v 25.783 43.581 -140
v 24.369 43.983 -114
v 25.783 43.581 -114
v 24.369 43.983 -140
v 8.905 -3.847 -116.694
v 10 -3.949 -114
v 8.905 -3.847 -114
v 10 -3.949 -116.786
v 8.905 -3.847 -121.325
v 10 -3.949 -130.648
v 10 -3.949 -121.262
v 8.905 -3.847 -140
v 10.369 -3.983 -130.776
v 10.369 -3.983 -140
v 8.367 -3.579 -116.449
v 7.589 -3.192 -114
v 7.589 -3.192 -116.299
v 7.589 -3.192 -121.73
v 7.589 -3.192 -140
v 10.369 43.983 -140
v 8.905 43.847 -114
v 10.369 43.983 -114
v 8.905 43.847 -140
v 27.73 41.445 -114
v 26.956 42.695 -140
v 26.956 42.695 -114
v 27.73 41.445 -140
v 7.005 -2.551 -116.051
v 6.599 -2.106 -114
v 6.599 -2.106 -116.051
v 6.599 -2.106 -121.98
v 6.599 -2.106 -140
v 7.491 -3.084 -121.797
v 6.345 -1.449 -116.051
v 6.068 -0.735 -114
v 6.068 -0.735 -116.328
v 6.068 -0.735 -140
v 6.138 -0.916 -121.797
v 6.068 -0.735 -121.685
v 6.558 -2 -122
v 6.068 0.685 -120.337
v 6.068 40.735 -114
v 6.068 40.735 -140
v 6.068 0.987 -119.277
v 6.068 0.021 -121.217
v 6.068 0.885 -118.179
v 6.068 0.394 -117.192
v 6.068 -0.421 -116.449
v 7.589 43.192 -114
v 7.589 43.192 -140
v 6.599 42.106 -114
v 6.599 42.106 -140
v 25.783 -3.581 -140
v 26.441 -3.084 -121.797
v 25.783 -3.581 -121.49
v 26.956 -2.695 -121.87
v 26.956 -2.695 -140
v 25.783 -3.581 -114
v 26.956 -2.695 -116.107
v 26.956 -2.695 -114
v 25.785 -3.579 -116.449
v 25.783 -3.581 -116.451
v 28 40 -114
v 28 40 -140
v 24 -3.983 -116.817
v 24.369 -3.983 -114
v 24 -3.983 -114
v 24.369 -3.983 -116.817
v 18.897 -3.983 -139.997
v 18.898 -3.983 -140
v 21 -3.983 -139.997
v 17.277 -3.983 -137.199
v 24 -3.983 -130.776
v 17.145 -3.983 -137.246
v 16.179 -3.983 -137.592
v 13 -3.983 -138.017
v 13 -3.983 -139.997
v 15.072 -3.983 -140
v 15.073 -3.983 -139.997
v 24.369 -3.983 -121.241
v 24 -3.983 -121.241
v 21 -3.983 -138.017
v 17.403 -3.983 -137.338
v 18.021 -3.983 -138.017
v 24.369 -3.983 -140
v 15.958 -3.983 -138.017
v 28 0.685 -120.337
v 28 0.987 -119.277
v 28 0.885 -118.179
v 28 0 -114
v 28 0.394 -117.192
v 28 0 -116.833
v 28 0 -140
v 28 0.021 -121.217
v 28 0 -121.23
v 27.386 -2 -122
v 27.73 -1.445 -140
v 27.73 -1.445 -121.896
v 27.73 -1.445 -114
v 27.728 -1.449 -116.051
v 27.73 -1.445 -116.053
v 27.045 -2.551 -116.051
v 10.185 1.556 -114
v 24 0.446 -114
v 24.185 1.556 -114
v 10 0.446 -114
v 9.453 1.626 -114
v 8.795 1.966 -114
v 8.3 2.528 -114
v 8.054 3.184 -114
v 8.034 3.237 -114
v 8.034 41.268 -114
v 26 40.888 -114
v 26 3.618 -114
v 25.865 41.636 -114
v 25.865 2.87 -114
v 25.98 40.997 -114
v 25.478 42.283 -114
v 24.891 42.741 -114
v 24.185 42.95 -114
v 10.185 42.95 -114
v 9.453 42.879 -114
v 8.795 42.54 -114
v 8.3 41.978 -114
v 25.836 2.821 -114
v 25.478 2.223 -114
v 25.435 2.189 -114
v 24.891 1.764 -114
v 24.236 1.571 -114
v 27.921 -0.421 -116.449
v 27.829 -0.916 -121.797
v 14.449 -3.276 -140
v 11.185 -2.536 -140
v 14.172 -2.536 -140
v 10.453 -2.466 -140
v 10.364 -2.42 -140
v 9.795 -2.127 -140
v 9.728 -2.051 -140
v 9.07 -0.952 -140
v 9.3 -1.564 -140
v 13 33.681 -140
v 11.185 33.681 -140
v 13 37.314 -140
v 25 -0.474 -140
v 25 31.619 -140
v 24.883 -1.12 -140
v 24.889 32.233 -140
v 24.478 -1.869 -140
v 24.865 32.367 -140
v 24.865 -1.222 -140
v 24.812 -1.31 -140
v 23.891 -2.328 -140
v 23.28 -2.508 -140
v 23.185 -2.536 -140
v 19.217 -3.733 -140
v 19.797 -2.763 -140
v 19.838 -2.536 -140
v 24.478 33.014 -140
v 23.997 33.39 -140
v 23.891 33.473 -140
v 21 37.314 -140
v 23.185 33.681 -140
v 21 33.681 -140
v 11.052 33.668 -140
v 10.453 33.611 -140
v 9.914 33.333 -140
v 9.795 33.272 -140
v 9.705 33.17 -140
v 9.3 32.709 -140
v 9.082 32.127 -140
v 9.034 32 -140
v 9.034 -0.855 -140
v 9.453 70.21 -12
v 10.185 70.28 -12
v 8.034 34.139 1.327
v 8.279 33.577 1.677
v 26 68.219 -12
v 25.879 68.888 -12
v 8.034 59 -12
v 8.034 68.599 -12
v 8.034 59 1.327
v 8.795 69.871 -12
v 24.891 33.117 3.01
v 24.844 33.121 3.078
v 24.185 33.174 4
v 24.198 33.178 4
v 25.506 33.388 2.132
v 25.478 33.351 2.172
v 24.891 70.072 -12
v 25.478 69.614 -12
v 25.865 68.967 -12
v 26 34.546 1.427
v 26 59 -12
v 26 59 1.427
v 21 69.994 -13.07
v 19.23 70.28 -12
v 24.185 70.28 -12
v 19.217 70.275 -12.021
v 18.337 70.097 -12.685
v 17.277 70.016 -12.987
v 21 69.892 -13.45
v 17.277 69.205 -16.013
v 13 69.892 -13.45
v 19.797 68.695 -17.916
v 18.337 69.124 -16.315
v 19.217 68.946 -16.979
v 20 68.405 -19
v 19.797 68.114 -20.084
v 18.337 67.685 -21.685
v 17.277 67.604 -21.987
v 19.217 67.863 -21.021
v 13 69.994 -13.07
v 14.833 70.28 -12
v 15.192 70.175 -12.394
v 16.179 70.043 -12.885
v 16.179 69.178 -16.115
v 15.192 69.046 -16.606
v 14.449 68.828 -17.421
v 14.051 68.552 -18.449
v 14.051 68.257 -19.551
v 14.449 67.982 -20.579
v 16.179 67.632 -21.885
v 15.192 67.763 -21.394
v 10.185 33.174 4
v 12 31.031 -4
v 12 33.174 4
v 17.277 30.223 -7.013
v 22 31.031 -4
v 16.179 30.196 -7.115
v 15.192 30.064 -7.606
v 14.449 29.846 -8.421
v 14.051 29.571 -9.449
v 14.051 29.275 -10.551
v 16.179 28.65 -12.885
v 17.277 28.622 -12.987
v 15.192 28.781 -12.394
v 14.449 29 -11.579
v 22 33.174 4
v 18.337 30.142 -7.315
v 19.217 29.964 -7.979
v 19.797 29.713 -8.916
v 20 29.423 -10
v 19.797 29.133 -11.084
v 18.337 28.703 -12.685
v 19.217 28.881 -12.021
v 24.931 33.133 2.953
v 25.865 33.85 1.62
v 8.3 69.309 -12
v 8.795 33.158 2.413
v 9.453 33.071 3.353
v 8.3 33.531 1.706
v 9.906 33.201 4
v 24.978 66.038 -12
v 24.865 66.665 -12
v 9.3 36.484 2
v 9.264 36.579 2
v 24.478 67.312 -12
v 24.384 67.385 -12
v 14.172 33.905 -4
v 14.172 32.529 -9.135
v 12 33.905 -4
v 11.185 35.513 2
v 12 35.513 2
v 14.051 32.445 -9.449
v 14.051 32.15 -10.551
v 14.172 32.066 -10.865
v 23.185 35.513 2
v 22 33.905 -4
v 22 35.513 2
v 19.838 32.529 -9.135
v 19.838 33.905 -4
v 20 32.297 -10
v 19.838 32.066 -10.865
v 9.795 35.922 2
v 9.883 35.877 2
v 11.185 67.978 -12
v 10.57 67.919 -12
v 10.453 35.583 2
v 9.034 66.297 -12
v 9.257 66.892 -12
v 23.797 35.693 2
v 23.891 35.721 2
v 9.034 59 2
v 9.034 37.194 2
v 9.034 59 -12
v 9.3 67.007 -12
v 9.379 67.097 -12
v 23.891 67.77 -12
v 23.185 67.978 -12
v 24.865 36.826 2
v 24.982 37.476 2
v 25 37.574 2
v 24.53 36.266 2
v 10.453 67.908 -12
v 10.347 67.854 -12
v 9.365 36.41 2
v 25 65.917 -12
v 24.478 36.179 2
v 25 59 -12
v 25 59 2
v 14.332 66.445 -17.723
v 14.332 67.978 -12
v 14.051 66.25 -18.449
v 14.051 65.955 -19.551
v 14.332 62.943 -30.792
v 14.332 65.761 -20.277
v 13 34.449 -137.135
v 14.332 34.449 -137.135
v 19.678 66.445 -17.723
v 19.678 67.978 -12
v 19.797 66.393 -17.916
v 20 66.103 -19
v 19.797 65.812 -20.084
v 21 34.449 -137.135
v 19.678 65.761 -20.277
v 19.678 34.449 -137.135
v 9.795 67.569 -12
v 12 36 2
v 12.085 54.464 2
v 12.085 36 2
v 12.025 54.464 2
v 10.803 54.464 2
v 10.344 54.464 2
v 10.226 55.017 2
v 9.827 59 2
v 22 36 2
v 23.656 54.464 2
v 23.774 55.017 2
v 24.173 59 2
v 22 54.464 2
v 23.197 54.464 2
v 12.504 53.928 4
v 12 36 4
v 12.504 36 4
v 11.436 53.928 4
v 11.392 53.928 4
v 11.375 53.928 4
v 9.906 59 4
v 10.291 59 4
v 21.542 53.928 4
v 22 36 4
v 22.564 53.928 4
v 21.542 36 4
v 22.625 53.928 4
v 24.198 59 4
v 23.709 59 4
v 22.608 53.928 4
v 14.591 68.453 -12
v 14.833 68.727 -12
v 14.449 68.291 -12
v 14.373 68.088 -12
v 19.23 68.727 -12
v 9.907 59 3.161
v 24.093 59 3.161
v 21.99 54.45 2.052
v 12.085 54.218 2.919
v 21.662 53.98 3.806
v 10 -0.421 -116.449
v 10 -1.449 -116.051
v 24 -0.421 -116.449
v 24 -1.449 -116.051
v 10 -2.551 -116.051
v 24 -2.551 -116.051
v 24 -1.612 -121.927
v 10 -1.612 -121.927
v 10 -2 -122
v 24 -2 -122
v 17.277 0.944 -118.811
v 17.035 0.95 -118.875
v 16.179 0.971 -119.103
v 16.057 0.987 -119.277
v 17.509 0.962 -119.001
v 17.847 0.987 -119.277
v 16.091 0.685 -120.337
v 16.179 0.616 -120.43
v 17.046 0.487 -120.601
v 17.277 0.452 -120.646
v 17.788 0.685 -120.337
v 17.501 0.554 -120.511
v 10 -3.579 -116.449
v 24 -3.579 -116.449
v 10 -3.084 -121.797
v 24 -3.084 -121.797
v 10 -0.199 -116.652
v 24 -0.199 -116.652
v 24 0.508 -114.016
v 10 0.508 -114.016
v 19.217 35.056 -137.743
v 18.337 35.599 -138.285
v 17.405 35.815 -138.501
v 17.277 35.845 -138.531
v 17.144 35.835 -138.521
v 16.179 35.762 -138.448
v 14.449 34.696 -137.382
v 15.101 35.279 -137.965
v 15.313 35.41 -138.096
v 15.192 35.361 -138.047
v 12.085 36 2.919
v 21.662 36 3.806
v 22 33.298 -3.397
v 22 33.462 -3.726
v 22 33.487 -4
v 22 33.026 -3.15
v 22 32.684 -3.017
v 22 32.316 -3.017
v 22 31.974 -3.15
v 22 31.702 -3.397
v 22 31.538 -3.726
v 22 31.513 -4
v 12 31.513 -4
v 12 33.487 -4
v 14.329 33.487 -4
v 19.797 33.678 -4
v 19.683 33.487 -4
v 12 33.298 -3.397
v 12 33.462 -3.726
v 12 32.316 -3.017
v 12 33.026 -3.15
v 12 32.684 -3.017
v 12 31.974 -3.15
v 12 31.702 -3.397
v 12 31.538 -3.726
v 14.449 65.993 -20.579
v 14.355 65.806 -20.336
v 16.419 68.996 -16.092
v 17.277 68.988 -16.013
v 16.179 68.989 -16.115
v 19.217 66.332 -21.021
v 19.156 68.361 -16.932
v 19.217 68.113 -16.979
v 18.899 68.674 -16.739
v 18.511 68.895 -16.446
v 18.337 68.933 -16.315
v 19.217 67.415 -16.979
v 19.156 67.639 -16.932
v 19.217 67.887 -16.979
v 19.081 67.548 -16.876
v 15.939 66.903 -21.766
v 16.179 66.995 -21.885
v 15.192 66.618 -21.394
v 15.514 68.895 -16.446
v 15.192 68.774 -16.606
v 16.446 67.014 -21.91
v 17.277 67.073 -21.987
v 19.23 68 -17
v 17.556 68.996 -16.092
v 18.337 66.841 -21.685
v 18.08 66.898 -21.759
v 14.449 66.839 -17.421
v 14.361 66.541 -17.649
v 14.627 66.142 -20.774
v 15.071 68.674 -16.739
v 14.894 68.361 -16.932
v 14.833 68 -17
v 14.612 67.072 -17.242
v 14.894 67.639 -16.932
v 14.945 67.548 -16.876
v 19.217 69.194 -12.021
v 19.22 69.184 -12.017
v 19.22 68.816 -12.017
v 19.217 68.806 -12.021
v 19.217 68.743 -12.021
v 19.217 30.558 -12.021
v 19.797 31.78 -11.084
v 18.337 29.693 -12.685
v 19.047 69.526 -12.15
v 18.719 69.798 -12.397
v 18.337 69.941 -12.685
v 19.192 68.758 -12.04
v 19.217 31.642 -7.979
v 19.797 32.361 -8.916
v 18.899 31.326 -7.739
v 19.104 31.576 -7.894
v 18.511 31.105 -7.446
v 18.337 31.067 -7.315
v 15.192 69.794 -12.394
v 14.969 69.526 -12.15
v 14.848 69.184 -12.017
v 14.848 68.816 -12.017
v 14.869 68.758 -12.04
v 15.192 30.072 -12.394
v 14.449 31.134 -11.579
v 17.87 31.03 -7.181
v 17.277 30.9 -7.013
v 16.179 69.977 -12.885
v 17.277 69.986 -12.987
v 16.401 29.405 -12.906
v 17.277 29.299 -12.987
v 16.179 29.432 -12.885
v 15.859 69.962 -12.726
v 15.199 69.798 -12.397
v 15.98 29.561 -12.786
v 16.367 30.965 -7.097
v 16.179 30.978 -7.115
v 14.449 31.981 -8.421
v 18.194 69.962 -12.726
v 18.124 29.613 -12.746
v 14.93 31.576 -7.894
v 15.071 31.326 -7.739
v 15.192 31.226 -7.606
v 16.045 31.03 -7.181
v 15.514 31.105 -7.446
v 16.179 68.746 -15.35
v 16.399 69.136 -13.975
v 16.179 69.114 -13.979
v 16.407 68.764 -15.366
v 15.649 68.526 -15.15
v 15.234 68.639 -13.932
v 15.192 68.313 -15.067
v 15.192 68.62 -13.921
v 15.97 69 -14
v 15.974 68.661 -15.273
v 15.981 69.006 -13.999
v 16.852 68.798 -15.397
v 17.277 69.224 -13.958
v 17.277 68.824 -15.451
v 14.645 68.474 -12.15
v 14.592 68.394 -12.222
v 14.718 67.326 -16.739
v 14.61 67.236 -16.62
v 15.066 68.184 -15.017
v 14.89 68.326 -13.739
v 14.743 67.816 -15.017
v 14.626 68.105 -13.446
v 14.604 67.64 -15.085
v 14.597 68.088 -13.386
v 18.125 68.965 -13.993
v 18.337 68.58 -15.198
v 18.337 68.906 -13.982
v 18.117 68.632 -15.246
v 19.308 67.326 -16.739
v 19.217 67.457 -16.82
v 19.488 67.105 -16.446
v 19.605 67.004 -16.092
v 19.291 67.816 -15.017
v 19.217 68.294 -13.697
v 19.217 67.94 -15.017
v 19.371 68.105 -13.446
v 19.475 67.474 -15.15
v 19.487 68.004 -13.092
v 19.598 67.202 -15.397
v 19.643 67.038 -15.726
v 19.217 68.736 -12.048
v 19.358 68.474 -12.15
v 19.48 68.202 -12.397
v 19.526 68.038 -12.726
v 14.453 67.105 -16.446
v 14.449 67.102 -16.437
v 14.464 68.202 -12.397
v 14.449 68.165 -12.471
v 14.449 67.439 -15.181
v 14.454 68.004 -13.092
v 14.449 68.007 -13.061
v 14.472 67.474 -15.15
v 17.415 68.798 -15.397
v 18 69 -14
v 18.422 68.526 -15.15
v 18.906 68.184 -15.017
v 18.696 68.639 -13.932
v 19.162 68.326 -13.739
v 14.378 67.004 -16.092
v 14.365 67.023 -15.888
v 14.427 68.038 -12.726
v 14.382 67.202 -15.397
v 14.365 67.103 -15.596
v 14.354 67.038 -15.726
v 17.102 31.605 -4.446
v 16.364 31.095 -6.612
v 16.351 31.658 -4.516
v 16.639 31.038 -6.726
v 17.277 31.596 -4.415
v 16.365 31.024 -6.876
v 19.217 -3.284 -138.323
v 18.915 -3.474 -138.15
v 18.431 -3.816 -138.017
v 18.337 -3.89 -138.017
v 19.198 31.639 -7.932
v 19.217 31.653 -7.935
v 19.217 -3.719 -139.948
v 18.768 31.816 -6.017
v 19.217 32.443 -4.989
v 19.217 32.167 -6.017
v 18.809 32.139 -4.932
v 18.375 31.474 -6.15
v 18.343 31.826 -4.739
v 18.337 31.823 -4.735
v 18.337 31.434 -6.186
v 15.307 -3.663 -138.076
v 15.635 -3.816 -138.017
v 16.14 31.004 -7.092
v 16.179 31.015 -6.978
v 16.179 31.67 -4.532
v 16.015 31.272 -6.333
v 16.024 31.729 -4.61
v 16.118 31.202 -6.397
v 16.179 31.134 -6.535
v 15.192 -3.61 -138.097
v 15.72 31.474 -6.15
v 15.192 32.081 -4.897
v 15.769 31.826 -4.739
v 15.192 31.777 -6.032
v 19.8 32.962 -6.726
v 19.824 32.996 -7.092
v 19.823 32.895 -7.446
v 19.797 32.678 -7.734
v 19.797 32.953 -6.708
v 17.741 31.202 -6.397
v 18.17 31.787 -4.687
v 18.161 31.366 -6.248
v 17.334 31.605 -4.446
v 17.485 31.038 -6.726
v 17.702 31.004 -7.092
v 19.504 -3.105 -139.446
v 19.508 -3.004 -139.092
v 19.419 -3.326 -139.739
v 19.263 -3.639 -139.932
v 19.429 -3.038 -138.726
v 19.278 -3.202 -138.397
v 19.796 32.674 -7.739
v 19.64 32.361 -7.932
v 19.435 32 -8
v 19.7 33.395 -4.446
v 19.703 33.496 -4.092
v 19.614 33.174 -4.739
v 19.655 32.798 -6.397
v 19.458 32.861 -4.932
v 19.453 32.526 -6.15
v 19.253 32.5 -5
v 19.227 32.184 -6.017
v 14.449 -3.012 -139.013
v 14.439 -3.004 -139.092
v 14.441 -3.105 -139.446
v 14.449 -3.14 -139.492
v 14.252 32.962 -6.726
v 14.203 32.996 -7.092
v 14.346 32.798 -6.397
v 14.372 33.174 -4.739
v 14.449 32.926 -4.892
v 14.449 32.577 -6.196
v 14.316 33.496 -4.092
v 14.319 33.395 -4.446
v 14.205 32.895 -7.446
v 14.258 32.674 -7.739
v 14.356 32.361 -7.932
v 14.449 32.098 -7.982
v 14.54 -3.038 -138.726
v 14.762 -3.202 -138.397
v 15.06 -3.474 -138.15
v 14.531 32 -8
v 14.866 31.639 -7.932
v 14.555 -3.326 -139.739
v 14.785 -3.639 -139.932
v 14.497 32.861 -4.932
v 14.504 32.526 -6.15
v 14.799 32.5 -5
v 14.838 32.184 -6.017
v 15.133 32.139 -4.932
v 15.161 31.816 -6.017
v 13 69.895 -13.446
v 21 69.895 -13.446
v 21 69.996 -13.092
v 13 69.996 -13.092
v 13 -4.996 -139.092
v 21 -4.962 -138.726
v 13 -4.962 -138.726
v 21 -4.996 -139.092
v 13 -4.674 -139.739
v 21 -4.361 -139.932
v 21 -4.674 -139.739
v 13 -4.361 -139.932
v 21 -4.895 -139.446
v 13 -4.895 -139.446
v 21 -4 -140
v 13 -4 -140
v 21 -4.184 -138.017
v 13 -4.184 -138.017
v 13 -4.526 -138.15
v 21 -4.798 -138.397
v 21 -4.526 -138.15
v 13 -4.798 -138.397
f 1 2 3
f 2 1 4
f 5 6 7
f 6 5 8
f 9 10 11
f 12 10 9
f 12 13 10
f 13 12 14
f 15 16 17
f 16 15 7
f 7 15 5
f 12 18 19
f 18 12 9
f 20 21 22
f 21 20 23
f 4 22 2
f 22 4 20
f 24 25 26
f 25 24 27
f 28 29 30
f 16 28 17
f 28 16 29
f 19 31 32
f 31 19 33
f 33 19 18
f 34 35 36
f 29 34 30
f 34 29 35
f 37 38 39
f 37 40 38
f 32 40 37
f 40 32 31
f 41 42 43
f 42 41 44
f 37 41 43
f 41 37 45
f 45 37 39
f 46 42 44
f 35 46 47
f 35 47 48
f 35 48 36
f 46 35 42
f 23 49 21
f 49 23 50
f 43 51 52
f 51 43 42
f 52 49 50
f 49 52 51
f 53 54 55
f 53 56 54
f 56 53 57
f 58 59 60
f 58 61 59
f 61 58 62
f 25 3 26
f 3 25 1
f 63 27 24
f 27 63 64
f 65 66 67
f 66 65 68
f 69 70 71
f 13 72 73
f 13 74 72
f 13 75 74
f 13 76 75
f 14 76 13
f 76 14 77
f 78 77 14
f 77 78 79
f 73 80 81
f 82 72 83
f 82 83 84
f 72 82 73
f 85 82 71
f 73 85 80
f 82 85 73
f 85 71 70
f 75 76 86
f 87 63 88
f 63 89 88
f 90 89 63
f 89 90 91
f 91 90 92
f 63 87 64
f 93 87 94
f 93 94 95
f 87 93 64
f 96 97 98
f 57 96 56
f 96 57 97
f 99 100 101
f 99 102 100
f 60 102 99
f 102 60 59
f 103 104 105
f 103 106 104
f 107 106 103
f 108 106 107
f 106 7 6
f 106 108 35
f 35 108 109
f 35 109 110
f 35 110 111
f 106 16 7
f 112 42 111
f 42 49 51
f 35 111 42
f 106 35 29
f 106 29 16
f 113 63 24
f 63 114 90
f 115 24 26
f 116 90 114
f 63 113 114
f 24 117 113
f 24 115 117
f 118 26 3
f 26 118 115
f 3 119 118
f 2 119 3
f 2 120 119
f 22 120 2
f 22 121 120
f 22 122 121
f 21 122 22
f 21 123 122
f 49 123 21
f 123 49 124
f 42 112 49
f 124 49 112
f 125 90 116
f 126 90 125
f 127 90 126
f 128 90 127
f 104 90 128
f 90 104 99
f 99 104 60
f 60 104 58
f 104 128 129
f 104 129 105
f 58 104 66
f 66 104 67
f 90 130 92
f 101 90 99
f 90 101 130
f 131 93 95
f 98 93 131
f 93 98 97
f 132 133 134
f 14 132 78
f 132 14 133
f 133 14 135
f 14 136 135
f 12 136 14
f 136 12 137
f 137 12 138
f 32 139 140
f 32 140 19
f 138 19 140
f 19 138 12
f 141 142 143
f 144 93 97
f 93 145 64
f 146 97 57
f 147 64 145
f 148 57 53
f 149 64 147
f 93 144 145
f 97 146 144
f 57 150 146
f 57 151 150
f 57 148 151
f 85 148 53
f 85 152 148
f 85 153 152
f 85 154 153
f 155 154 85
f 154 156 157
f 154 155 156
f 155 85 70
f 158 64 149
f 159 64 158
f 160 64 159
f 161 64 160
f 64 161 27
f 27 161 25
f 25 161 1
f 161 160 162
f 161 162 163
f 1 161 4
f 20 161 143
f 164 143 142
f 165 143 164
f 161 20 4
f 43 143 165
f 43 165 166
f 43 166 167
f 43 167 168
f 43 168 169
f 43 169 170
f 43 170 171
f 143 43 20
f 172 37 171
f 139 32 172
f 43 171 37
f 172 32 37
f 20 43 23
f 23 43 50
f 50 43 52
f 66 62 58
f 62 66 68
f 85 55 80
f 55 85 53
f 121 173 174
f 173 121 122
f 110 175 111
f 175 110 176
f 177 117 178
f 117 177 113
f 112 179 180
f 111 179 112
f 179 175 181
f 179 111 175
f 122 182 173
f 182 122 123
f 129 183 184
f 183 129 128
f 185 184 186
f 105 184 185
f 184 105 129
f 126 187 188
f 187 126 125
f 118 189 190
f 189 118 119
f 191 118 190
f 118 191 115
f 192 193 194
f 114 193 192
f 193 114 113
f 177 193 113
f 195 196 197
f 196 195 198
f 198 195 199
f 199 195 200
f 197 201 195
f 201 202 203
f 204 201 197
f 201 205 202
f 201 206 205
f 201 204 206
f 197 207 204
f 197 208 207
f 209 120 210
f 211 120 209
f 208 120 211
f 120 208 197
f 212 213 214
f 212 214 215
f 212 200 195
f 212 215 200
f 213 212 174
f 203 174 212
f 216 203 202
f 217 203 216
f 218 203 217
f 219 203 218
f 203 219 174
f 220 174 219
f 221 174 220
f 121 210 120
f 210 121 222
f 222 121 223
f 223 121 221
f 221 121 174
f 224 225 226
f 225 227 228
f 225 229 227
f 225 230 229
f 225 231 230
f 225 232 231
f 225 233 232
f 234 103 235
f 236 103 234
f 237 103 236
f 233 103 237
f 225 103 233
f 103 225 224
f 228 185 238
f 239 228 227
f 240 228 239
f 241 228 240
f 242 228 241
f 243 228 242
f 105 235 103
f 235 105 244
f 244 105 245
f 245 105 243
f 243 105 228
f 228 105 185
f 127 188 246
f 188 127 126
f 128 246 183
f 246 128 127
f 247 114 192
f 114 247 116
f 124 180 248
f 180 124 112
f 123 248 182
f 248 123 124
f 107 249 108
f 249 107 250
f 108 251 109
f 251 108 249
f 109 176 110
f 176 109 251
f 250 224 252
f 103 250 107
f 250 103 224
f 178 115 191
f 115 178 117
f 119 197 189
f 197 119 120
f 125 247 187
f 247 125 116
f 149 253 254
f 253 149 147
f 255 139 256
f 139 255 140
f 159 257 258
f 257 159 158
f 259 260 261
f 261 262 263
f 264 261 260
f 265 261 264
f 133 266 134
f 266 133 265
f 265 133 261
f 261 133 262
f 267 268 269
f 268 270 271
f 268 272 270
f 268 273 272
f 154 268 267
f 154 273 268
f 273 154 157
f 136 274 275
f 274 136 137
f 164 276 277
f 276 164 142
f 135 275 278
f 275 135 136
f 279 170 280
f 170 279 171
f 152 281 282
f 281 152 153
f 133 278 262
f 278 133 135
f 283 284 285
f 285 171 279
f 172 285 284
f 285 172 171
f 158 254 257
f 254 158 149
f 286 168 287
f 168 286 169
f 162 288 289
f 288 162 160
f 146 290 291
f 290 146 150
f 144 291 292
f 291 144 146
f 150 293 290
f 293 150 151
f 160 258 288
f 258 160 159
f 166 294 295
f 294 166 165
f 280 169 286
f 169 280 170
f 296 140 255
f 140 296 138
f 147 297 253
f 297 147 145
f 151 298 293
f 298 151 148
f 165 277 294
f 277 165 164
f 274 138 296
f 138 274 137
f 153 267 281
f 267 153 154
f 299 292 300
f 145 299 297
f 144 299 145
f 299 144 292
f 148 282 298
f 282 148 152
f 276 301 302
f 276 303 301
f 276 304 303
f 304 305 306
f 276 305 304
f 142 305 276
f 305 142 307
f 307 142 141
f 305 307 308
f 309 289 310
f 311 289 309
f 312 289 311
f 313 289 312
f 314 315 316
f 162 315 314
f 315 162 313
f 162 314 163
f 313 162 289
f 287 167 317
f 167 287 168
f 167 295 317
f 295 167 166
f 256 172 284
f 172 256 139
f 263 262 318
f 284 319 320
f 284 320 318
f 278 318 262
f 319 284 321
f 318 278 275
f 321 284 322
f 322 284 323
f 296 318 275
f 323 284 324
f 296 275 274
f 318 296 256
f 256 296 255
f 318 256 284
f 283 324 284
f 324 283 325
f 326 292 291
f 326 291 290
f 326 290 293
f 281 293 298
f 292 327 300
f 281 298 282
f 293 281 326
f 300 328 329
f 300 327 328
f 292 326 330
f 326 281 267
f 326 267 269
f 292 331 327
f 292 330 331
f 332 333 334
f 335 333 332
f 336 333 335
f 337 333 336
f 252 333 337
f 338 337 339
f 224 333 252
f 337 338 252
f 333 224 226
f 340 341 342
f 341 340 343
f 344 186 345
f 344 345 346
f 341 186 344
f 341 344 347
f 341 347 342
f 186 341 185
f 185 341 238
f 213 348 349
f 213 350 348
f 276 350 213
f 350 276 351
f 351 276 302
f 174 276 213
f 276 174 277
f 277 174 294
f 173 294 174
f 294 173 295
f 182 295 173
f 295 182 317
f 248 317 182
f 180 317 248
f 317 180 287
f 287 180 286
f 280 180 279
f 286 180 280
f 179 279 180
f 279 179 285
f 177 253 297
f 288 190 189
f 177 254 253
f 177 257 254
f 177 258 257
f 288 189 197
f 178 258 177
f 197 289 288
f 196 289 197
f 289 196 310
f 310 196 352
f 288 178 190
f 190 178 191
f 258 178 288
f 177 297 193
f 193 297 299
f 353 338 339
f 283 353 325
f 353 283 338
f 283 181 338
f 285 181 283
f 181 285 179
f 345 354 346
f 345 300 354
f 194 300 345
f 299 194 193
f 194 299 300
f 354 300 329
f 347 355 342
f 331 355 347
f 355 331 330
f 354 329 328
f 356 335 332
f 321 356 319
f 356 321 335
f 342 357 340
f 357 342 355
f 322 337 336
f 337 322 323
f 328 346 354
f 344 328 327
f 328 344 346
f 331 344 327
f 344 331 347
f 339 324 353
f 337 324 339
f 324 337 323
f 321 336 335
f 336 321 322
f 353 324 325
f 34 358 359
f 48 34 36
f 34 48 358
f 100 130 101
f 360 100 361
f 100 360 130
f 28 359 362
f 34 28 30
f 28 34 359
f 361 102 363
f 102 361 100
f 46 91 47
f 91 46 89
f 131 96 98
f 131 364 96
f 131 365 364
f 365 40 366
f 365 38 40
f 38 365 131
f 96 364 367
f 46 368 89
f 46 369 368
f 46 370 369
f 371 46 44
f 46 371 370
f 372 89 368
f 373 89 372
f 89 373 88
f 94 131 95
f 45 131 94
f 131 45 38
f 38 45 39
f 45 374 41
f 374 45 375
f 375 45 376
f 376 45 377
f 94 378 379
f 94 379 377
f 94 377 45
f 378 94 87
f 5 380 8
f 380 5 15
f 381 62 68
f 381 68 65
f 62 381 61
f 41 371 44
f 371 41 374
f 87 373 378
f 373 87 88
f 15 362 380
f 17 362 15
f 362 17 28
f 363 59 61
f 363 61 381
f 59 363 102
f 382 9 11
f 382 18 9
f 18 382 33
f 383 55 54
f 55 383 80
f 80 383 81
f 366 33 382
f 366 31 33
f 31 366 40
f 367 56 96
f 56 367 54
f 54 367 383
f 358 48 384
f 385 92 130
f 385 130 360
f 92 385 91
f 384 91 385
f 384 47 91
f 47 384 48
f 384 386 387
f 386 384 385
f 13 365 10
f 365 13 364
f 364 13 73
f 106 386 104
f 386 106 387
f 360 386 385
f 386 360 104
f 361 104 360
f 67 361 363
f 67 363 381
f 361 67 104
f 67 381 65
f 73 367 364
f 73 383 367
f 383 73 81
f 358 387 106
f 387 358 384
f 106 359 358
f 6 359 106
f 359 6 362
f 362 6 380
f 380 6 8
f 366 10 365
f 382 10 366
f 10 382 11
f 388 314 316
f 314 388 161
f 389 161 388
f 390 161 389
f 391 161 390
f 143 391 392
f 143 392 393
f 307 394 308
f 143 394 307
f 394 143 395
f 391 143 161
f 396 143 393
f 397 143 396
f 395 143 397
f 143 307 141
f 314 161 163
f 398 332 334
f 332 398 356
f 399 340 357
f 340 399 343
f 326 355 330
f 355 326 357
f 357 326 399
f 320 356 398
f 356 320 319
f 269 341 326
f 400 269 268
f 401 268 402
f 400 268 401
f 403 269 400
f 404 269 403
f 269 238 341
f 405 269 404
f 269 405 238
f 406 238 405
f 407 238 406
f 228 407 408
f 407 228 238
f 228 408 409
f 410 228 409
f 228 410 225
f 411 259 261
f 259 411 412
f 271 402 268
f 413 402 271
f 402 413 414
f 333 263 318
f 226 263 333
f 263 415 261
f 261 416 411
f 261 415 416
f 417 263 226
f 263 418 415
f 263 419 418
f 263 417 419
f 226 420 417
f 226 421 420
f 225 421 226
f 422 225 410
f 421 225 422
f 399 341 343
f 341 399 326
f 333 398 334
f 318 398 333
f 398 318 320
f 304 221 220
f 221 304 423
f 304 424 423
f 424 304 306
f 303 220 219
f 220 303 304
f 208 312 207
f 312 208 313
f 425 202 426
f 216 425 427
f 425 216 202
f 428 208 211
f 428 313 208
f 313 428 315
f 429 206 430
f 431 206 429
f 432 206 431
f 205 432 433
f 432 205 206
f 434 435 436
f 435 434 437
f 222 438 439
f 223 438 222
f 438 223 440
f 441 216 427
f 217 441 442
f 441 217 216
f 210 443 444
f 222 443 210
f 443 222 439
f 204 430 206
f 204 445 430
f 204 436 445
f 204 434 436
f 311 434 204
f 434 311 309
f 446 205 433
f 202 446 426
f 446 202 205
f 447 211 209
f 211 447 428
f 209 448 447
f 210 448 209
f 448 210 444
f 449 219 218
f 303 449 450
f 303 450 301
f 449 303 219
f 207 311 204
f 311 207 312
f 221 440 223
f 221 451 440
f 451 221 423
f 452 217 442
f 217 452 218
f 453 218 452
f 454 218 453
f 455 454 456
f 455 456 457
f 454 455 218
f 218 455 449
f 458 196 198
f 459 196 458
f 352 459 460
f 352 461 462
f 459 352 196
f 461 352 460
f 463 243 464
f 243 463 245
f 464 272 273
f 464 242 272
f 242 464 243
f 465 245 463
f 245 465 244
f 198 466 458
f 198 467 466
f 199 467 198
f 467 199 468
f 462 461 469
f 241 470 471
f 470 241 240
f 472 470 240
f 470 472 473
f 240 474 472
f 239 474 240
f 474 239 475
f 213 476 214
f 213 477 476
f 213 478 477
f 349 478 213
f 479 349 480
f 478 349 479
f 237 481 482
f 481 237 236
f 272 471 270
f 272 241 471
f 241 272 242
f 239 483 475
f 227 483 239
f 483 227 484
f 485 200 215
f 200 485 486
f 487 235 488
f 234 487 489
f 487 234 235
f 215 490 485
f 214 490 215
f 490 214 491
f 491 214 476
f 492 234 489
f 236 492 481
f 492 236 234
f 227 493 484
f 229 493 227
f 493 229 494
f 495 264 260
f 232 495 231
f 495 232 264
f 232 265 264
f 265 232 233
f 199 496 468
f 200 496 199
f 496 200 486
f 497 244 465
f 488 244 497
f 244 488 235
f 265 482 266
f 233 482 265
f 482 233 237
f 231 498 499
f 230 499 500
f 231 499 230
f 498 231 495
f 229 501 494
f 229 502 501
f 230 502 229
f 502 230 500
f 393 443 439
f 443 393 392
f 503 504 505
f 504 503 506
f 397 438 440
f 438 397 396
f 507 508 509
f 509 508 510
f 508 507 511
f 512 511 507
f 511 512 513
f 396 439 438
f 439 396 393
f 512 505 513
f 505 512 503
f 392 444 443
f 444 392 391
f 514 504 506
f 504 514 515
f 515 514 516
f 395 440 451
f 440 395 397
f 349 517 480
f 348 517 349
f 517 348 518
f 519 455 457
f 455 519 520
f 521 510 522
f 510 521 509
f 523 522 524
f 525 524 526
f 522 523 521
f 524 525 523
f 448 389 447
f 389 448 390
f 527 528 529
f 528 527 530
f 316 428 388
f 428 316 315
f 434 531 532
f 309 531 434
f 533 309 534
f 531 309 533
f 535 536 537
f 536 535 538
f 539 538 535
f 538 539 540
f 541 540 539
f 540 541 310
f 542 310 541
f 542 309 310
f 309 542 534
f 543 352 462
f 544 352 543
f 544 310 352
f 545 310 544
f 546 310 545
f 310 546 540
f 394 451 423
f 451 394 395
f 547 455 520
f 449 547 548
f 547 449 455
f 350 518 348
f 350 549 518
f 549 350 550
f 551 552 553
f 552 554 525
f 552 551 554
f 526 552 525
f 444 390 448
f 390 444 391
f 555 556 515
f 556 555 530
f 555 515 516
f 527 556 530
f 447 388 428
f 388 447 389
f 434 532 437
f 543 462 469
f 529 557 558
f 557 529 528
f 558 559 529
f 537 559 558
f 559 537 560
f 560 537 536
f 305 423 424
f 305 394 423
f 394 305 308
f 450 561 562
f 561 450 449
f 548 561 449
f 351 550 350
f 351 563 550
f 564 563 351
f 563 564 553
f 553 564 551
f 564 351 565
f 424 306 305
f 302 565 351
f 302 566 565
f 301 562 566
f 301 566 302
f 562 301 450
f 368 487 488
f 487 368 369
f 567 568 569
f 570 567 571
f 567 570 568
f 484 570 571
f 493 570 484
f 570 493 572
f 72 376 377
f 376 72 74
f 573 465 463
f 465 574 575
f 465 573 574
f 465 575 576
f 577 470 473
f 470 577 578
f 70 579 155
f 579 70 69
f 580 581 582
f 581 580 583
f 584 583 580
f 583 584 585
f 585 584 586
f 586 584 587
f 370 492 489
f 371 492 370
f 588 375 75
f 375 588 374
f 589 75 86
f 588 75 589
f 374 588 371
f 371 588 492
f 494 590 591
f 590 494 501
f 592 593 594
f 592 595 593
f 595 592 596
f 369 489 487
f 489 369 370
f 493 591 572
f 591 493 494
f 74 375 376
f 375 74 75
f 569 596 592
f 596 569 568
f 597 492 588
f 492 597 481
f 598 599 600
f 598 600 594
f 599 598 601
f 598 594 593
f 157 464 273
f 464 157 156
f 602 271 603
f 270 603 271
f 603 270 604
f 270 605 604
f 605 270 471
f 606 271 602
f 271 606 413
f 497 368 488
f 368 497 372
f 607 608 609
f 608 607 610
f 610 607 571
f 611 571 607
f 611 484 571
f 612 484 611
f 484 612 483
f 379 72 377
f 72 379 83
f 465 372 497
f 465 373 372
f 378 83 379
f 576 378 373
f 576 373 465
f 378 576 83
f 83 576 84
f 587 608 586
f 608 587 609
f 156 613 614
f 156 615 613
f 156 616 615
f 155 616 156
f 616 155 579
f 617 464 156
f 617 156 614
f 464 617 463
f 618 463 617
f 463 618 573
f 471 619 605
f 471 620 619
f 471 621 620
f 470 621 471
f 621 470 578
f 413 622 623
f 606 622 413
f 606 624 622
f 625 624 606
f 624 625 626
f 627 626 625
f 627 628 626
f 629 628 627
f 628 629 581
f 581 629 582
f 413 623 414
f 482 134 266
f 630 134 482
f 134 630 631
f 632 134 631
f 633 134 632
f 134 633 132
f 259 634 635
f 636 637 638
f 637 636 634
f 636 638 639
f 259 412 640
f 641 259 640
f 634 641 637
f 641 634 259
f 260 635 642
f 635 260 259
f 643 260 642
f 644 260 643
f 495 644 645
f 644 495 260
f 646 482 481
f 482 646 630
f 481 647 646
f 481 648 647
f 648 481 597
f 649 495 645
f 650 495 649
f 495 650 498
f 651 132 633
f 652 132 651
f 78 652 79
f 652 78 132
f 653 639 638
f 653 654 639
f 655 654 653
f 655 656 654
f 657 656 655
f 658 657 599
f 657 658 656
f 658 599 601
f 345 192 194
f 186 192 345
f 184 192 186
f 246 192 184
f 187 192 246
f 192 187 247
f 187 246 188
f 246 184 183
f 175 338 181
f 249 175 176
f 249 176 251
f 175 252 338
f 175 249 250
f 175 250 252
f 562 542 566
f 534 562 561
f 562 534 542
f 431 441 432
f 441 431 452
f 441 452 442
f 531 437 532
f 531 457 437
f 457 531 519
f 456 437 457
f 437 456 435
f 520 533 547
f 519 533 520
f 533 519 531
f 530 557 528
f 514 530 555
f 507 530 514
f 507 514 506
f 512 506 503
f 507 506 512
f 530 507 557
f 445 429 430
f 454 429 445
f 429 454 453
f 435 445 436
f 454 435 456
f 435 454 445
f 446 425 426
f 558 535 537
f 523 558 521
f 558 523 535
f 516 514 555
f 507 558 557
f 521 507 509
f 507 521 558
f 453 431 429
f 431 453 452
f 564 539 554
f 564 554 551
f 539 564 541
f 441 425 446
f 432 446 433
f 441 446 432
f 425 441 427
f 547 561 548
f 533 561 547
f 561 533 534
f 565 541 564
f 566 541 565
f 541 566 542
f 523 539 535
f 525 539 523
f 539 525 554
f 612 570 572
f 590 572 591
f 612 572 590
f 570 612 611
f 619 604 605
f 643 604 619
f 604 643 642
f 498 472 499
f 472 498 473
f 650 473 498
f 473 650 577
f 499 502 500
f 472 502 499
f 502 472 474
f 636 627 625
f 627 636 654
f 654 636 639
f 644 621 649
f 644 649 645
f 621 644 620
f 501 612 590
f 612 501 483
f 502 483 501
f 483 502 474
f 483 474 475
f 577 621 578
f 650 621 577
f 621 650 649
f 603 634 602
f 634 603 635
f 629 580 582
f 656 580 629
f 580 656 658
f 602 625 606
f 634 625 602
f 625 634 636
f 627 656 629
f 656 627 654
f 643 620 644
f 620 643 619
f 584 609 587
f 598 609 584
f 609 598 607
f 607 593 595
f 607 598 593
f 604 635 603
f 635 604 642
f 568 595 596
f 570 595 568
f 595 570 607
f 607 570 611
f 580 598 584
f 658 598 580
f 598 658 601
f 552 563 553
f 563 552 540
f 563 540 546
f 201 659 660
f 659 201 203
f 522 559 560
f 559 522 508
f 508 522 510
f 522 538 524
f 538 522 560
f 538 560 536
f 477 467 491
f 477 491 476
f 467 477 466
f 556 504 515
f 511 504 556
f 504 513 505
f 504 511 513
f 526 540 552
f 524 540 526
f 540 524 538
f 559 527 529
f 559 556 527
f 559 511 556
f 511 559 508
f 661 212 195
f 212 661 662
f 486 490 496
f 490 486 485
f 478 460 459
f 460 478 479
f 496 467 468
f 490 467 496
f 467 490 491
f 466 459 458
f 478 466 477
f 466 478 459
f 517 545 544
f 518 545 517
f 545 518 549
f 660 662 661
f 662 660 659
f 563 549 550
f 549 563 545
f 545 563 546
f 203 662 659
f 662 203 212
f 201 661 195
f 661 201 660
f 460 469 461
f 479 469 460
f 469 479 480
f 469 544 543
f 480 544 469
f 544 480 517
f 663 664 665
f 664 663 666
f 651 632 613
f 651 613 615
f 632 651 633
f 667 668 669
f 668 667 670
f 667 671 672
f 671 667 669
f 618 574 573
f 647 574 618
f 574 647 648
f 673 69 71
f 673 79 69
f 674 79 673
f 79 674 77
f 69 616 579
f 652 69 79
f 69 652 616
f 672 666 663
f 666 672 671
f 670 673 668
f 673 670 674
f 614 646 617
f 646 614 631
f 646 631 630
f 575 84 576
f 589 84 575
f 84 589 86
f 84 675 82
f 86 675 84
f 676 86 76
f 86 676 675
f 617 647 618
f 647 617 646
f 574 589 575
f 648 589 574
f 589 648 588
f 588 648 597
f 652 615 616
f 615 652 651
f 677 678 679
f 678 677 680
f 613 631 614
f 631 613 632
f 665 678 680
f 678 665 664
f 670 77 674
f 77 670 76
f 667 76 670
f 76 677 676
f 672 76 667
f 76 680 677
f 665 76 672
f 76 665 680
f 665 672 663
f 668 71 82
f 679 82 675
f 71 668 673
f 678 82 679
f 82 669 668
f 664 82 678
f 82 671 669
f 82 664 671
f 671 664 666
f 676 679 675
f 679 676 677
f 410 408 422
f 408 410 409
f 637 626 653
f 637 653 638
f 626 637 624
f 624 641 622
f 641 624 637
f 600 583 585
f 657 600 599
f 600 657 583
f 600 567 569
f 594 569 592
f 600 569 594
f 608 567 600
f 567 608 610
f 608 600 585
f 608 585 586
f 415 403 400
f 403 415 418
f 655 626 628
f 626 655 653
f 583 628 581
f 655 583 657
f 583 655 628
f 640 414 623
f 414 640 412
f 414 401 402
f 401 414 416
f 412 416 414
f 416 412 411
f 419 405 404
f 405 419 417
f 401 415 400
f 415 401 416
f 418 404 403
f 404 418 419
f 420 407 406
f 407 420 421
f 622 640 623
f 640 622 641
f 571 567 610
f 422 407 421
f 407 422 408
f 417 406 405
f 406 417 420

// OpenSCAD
$fn=17;   // For persion of polygons





union(){
difference(){
union(){ // brick
translate([10,0,-140]){  // clip base
minkowski(){
  cube([14,40,25]);
  cylinder(r=4,h=1);
}}

rotate([-15,0,0]){  // clip
translate([10,33,-120]){
minkowski(){
  cube([14,36,140]);
  cylinder(r=2,h=1);
}}}}


translate([0,0,4]){ // cut the top off
    cube([100,100,100]);
}
/*
rotate([-15,0,0]){  // clip hollow
translate([11,36,-160]){
minkowski(){
  cube([12,30,200]);
  cylinder(r=2,h=1);
}}}*/

translate([-5,59,-12]){ // cut front top off
  cube([50,40,20]);
}

translate([17,55,0]){ // bore
rotate([0,90,90]){
rotate([0,-15,0]){
    cylinder(25,r=9,7);
}}}

translate([-20,-2,-119]){  // release handle1
rotate([0,90,0]){
  cylinder(r=3,h=90);
}}
rotate([-15,0,0]){  // release handle2
translate([10,15,-150]){
  cube([14,15,40]);}}
/*
translate([17,-2,-140]){//remove bottom
  sphere(4);}
translate([17,34,-140]){//remove bottom2
  sphere(4);}*/
translate([13,33,-147]){//remove bottom2
  rotate([45,0,0]){cube(8);}}
translate([0,0,-3]){
difference(){    // setting up the top
rotate([-15,0,0]){  // clip hollow
translate([11,35,-160]){
minkowski(){
  cube([12,31,200]);
  cylinder(r=2,h=1);
}}}
translate([0,0,5]){ // cut the top off
    cube([100,100,100]);
}}}

translate([17,0,2]){  // plunger hole
rotate([-90,0,0]){
  cylinder(r=5,h=90);
}}
translate([12,0,-4]){ // hole for plunger
    cube([10,36,10]);
}

translate([17,60,-19]){  // rubberband hole2
rotate([-90,0,0]){
  cylinder(r=3,h=20);
}}
translate([17,0,-10]){  // rubberband hole
rotate([-90,0,0]){
  cylinder(r=3,h=90);
}}
translate([17,27,-160]){
rotate([-15,0,0]){  // rubberband track1
  cylinder(r=3,h=190);
}}
translate([17,-7,-160]){
rotate([-15,0,0]){  // rubberband track2
  cylinder(r=3,h=190);
}}
translate([30.5,0,-5]){ // cut the top off angle 1
rotate([0,-35,0]){
    cube([5,100,100]);
}}
translate([-2.5,0,-5]){ // cut the top off angle 2
rotate([0,35,0]){
    cube([5,100,100]);
}}
}


// the last union
translate([13,68,-16]){  // rubberband cutter fix 1
rotate([0,90,0]){
    cylinder(8,r=1,1);
}}
translate([13,32,-7]){  // rubberband cutter fix 2
rotate([0,90,0]){
    cylinder(8,r=1,1);
}}
translate([13,69,-13]){  // rubberband cutter fix 1
rotate([0,90,0]){
    cylinder(8,r=1,1);
}}
translate([13,-4,-139]){  // rubberband cutter fix bottom
rotate([0,90,0]){
    cylinder(8,r=1,1);
}}
translate([10,32.5,-4]){  // rubberband cutter fix 2
rotate([0,90,0]){
    cylinder(13,r=1,1);
}}
}
